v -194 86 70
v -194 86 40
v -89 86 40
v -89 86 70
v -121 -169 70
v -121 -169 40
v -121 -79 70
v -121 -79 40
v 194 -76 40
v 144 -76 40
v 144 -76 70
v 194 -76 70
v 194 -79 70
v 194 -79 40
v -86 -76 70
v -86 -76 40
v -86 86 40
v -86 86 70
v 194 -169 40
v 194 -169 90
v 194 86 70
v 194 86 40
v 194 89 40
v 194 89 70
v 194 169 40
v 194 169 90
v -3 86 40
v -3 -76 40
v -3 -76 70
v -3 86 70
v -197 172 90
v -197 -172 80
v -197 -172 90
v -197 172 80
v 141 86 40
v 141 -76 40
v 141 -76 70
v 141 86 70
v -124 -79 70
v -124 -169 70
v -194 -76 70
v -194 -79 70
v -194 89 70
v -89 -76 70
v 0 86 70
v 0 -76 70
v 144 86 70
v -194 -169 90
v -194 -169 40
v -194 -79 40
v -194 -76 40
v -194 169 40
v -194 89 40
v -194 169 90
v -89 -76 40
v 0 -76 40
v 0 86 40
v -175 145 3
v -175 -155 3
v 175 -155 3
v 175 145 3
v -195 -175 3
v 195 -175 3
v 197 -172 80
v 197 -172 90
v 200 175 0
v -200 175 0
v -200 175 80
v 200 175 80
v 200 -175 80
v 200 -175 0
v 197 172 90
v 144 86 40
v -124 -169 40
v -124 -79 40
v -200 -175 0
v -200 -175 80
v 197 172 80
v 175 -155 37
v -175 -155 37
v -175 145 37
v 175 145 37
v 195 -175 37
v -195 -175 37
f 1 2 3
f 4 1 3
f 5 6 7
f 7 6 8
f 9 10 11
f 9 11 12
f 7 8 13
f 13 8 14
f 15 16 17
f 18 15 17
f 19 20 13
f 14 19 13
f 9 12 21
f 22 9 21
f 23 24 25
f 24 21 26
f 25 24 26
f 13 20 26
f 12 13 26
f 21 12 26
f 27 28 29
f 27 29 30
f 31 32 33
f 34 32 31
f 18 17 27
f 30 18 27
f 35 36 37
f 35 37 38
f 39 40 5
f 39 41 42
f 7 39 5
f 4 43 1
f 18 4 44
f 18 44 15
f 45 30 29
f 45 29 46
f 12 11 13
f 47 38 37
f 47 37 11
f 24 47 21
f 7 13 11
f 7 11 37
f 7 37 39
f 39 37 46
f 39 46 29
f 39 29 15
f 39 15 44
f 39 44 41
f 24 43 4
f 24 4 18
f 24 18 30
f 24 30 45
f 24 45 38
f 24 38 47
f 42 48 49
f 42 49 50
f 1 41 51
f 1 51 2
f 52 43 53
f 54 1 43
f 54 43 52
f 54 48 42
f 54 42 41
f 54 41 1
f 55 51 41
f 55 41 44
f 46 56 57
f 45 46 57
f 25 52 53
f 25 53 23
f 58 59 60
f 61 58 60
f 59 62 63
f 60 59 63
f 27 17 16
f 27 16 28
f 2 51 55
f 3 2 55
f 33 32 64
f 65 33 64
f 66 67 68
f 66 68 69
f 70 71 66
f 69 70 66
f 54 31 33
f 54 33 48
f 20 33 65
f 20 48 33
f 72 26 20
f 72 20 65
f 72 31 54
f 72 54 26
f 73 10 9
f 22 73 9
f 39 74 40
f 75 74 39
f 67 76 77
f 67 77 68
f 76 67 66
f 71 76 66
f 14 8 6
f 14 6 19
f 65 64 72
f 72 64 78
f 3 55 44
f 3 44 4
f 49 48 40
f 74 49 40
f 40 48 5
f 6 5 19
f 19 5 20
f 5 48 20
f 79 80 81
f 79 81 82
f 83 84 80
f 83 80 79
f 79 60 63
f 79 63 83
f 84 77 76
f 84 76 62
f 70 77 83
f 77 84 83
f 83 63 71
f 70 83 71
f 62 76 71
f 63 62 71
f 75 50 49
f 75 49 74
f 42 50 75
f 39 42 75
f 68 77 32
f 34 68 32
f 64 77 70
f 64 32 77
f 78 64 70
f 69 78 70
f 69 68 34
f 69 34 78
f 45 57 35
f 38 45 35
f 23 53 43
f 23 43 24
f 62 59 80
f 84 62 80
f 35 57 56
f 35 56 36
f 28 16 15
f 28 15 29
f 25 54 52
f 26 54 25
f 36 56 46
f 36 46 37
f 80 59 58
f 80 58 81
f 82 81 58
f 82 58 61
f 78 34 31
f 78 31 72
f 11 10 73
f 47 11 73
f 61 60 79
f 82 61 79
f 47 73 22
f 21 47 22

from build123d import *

# Parameters (mm, degrees)
SKETCH_1_W          = 400
SKETCH_1_H          = 350
EXTRUDE_1_DEPTH     = 80
SKETCH_2_W          = 394
SKETCH_2_H          = 344
EXTRUDE_2_DEPTH     = 10
SKETCH_3_W          = 388
SKETCH_3_H          = 338
CUT_EXTRUDE_1_DEPTH = 50
SKETCH_4_W          = 388
SKETCH_4_H          = 3
EXTRUDE_3_DEPTH     = 30
SKETCH_5_W          = 3
SKETCH_5_H          = 162
SKETCH_5_H_2        = 90
EXTRUDE_4_DEPTH     = 30
SKETCH_6_W          = 350
SKETCH_6_H          = 34
CUT_EXTRUDE_2_DEPTH = 320
CHAMFER_1_SIZE      = 20


with BuildPart() as part:
    # 草图1 → 凸台-拉伸1 (new body)
    with BuildSketch(Plane.XY):
        Rectangle(SKETCH_1_W, SKETCH_1_H)
    extrude(amount=EXTRUDE_1_DEPTH)

    # 草图2 → 凸台-拉伸2 (add)
    with BuildSketch(Plane.XY.offset(80)):
        Rectangle(SKETCH_2_W, SKETCH_2_H)
    extrude(amount=EXTRUDE_2_DEPTH)

    # 草图3 → 切除-拉伸1 (cut)
    with BuildSketch(Plane.XY.offset(90)):
        Rectangle(SKETCH_3_W, SKETCH_3_H)
    extrude(amount=-CUT_EXTRUDE_1_DEPTH, mode=Mode.SUBTRACT)

    # 草图4 → 凸台-拉伸3 (add)
    with BuildSketch(Plane.XY.offset(40)):
        with Locations((0, 87.5)):
            Rectangle(SKETCH_4_W, SKETCH_4_H)
        with Locations((0, -77.5)):
            Rectangle(SKETCH_4_W, SKETCH_4_H)
    extrude(amount=EXTRUDE_3_DEPTH)

    # 草图5 → 凸台-拉伸4 (add)
    with BuildSketch(Plane.XY.offset(40)):
        with Locations((-87.5, 5)):
            Rectangle(SKETCH_5_W, SKETCH_5_H)
        with Locations((-1.5, 5)):
            Rectangle(SKETCH_5_W, SKETCH_5_H)
        with Locations((142.5, 5)):
            Rectangle(SKETCH_5_W, SKETCH_5_H)
        with Locations((-122.5, -124)):
            Rectangle(SKETCH_5_W, SKETCH_5_H_2)
    extrude(amount=EXTRUDE_4_DEPTH)

    # 草图6 → 切除-拉伸2 (cut)
    with BuildSketch(Plane.XZ.offset(175)):
        with Locations((0, 20)):
            Rectangle(SKETCH_6_W, SKETCH_6_H)
    extrude(amount=-CUT_EXTRUDE_2_DEPTH, mode=Mode.SUBTRACT)

    # 倒角1
    chamfer_1_edges = [part.edges().sort_by_distance(p)[0] for p in [
        (175, -175, 20),
        (-175, -175, 20),
    ]]
    chamfer(chamfer_1_edges, length=CHAMFER_1_SIZE)


solid = part.part
